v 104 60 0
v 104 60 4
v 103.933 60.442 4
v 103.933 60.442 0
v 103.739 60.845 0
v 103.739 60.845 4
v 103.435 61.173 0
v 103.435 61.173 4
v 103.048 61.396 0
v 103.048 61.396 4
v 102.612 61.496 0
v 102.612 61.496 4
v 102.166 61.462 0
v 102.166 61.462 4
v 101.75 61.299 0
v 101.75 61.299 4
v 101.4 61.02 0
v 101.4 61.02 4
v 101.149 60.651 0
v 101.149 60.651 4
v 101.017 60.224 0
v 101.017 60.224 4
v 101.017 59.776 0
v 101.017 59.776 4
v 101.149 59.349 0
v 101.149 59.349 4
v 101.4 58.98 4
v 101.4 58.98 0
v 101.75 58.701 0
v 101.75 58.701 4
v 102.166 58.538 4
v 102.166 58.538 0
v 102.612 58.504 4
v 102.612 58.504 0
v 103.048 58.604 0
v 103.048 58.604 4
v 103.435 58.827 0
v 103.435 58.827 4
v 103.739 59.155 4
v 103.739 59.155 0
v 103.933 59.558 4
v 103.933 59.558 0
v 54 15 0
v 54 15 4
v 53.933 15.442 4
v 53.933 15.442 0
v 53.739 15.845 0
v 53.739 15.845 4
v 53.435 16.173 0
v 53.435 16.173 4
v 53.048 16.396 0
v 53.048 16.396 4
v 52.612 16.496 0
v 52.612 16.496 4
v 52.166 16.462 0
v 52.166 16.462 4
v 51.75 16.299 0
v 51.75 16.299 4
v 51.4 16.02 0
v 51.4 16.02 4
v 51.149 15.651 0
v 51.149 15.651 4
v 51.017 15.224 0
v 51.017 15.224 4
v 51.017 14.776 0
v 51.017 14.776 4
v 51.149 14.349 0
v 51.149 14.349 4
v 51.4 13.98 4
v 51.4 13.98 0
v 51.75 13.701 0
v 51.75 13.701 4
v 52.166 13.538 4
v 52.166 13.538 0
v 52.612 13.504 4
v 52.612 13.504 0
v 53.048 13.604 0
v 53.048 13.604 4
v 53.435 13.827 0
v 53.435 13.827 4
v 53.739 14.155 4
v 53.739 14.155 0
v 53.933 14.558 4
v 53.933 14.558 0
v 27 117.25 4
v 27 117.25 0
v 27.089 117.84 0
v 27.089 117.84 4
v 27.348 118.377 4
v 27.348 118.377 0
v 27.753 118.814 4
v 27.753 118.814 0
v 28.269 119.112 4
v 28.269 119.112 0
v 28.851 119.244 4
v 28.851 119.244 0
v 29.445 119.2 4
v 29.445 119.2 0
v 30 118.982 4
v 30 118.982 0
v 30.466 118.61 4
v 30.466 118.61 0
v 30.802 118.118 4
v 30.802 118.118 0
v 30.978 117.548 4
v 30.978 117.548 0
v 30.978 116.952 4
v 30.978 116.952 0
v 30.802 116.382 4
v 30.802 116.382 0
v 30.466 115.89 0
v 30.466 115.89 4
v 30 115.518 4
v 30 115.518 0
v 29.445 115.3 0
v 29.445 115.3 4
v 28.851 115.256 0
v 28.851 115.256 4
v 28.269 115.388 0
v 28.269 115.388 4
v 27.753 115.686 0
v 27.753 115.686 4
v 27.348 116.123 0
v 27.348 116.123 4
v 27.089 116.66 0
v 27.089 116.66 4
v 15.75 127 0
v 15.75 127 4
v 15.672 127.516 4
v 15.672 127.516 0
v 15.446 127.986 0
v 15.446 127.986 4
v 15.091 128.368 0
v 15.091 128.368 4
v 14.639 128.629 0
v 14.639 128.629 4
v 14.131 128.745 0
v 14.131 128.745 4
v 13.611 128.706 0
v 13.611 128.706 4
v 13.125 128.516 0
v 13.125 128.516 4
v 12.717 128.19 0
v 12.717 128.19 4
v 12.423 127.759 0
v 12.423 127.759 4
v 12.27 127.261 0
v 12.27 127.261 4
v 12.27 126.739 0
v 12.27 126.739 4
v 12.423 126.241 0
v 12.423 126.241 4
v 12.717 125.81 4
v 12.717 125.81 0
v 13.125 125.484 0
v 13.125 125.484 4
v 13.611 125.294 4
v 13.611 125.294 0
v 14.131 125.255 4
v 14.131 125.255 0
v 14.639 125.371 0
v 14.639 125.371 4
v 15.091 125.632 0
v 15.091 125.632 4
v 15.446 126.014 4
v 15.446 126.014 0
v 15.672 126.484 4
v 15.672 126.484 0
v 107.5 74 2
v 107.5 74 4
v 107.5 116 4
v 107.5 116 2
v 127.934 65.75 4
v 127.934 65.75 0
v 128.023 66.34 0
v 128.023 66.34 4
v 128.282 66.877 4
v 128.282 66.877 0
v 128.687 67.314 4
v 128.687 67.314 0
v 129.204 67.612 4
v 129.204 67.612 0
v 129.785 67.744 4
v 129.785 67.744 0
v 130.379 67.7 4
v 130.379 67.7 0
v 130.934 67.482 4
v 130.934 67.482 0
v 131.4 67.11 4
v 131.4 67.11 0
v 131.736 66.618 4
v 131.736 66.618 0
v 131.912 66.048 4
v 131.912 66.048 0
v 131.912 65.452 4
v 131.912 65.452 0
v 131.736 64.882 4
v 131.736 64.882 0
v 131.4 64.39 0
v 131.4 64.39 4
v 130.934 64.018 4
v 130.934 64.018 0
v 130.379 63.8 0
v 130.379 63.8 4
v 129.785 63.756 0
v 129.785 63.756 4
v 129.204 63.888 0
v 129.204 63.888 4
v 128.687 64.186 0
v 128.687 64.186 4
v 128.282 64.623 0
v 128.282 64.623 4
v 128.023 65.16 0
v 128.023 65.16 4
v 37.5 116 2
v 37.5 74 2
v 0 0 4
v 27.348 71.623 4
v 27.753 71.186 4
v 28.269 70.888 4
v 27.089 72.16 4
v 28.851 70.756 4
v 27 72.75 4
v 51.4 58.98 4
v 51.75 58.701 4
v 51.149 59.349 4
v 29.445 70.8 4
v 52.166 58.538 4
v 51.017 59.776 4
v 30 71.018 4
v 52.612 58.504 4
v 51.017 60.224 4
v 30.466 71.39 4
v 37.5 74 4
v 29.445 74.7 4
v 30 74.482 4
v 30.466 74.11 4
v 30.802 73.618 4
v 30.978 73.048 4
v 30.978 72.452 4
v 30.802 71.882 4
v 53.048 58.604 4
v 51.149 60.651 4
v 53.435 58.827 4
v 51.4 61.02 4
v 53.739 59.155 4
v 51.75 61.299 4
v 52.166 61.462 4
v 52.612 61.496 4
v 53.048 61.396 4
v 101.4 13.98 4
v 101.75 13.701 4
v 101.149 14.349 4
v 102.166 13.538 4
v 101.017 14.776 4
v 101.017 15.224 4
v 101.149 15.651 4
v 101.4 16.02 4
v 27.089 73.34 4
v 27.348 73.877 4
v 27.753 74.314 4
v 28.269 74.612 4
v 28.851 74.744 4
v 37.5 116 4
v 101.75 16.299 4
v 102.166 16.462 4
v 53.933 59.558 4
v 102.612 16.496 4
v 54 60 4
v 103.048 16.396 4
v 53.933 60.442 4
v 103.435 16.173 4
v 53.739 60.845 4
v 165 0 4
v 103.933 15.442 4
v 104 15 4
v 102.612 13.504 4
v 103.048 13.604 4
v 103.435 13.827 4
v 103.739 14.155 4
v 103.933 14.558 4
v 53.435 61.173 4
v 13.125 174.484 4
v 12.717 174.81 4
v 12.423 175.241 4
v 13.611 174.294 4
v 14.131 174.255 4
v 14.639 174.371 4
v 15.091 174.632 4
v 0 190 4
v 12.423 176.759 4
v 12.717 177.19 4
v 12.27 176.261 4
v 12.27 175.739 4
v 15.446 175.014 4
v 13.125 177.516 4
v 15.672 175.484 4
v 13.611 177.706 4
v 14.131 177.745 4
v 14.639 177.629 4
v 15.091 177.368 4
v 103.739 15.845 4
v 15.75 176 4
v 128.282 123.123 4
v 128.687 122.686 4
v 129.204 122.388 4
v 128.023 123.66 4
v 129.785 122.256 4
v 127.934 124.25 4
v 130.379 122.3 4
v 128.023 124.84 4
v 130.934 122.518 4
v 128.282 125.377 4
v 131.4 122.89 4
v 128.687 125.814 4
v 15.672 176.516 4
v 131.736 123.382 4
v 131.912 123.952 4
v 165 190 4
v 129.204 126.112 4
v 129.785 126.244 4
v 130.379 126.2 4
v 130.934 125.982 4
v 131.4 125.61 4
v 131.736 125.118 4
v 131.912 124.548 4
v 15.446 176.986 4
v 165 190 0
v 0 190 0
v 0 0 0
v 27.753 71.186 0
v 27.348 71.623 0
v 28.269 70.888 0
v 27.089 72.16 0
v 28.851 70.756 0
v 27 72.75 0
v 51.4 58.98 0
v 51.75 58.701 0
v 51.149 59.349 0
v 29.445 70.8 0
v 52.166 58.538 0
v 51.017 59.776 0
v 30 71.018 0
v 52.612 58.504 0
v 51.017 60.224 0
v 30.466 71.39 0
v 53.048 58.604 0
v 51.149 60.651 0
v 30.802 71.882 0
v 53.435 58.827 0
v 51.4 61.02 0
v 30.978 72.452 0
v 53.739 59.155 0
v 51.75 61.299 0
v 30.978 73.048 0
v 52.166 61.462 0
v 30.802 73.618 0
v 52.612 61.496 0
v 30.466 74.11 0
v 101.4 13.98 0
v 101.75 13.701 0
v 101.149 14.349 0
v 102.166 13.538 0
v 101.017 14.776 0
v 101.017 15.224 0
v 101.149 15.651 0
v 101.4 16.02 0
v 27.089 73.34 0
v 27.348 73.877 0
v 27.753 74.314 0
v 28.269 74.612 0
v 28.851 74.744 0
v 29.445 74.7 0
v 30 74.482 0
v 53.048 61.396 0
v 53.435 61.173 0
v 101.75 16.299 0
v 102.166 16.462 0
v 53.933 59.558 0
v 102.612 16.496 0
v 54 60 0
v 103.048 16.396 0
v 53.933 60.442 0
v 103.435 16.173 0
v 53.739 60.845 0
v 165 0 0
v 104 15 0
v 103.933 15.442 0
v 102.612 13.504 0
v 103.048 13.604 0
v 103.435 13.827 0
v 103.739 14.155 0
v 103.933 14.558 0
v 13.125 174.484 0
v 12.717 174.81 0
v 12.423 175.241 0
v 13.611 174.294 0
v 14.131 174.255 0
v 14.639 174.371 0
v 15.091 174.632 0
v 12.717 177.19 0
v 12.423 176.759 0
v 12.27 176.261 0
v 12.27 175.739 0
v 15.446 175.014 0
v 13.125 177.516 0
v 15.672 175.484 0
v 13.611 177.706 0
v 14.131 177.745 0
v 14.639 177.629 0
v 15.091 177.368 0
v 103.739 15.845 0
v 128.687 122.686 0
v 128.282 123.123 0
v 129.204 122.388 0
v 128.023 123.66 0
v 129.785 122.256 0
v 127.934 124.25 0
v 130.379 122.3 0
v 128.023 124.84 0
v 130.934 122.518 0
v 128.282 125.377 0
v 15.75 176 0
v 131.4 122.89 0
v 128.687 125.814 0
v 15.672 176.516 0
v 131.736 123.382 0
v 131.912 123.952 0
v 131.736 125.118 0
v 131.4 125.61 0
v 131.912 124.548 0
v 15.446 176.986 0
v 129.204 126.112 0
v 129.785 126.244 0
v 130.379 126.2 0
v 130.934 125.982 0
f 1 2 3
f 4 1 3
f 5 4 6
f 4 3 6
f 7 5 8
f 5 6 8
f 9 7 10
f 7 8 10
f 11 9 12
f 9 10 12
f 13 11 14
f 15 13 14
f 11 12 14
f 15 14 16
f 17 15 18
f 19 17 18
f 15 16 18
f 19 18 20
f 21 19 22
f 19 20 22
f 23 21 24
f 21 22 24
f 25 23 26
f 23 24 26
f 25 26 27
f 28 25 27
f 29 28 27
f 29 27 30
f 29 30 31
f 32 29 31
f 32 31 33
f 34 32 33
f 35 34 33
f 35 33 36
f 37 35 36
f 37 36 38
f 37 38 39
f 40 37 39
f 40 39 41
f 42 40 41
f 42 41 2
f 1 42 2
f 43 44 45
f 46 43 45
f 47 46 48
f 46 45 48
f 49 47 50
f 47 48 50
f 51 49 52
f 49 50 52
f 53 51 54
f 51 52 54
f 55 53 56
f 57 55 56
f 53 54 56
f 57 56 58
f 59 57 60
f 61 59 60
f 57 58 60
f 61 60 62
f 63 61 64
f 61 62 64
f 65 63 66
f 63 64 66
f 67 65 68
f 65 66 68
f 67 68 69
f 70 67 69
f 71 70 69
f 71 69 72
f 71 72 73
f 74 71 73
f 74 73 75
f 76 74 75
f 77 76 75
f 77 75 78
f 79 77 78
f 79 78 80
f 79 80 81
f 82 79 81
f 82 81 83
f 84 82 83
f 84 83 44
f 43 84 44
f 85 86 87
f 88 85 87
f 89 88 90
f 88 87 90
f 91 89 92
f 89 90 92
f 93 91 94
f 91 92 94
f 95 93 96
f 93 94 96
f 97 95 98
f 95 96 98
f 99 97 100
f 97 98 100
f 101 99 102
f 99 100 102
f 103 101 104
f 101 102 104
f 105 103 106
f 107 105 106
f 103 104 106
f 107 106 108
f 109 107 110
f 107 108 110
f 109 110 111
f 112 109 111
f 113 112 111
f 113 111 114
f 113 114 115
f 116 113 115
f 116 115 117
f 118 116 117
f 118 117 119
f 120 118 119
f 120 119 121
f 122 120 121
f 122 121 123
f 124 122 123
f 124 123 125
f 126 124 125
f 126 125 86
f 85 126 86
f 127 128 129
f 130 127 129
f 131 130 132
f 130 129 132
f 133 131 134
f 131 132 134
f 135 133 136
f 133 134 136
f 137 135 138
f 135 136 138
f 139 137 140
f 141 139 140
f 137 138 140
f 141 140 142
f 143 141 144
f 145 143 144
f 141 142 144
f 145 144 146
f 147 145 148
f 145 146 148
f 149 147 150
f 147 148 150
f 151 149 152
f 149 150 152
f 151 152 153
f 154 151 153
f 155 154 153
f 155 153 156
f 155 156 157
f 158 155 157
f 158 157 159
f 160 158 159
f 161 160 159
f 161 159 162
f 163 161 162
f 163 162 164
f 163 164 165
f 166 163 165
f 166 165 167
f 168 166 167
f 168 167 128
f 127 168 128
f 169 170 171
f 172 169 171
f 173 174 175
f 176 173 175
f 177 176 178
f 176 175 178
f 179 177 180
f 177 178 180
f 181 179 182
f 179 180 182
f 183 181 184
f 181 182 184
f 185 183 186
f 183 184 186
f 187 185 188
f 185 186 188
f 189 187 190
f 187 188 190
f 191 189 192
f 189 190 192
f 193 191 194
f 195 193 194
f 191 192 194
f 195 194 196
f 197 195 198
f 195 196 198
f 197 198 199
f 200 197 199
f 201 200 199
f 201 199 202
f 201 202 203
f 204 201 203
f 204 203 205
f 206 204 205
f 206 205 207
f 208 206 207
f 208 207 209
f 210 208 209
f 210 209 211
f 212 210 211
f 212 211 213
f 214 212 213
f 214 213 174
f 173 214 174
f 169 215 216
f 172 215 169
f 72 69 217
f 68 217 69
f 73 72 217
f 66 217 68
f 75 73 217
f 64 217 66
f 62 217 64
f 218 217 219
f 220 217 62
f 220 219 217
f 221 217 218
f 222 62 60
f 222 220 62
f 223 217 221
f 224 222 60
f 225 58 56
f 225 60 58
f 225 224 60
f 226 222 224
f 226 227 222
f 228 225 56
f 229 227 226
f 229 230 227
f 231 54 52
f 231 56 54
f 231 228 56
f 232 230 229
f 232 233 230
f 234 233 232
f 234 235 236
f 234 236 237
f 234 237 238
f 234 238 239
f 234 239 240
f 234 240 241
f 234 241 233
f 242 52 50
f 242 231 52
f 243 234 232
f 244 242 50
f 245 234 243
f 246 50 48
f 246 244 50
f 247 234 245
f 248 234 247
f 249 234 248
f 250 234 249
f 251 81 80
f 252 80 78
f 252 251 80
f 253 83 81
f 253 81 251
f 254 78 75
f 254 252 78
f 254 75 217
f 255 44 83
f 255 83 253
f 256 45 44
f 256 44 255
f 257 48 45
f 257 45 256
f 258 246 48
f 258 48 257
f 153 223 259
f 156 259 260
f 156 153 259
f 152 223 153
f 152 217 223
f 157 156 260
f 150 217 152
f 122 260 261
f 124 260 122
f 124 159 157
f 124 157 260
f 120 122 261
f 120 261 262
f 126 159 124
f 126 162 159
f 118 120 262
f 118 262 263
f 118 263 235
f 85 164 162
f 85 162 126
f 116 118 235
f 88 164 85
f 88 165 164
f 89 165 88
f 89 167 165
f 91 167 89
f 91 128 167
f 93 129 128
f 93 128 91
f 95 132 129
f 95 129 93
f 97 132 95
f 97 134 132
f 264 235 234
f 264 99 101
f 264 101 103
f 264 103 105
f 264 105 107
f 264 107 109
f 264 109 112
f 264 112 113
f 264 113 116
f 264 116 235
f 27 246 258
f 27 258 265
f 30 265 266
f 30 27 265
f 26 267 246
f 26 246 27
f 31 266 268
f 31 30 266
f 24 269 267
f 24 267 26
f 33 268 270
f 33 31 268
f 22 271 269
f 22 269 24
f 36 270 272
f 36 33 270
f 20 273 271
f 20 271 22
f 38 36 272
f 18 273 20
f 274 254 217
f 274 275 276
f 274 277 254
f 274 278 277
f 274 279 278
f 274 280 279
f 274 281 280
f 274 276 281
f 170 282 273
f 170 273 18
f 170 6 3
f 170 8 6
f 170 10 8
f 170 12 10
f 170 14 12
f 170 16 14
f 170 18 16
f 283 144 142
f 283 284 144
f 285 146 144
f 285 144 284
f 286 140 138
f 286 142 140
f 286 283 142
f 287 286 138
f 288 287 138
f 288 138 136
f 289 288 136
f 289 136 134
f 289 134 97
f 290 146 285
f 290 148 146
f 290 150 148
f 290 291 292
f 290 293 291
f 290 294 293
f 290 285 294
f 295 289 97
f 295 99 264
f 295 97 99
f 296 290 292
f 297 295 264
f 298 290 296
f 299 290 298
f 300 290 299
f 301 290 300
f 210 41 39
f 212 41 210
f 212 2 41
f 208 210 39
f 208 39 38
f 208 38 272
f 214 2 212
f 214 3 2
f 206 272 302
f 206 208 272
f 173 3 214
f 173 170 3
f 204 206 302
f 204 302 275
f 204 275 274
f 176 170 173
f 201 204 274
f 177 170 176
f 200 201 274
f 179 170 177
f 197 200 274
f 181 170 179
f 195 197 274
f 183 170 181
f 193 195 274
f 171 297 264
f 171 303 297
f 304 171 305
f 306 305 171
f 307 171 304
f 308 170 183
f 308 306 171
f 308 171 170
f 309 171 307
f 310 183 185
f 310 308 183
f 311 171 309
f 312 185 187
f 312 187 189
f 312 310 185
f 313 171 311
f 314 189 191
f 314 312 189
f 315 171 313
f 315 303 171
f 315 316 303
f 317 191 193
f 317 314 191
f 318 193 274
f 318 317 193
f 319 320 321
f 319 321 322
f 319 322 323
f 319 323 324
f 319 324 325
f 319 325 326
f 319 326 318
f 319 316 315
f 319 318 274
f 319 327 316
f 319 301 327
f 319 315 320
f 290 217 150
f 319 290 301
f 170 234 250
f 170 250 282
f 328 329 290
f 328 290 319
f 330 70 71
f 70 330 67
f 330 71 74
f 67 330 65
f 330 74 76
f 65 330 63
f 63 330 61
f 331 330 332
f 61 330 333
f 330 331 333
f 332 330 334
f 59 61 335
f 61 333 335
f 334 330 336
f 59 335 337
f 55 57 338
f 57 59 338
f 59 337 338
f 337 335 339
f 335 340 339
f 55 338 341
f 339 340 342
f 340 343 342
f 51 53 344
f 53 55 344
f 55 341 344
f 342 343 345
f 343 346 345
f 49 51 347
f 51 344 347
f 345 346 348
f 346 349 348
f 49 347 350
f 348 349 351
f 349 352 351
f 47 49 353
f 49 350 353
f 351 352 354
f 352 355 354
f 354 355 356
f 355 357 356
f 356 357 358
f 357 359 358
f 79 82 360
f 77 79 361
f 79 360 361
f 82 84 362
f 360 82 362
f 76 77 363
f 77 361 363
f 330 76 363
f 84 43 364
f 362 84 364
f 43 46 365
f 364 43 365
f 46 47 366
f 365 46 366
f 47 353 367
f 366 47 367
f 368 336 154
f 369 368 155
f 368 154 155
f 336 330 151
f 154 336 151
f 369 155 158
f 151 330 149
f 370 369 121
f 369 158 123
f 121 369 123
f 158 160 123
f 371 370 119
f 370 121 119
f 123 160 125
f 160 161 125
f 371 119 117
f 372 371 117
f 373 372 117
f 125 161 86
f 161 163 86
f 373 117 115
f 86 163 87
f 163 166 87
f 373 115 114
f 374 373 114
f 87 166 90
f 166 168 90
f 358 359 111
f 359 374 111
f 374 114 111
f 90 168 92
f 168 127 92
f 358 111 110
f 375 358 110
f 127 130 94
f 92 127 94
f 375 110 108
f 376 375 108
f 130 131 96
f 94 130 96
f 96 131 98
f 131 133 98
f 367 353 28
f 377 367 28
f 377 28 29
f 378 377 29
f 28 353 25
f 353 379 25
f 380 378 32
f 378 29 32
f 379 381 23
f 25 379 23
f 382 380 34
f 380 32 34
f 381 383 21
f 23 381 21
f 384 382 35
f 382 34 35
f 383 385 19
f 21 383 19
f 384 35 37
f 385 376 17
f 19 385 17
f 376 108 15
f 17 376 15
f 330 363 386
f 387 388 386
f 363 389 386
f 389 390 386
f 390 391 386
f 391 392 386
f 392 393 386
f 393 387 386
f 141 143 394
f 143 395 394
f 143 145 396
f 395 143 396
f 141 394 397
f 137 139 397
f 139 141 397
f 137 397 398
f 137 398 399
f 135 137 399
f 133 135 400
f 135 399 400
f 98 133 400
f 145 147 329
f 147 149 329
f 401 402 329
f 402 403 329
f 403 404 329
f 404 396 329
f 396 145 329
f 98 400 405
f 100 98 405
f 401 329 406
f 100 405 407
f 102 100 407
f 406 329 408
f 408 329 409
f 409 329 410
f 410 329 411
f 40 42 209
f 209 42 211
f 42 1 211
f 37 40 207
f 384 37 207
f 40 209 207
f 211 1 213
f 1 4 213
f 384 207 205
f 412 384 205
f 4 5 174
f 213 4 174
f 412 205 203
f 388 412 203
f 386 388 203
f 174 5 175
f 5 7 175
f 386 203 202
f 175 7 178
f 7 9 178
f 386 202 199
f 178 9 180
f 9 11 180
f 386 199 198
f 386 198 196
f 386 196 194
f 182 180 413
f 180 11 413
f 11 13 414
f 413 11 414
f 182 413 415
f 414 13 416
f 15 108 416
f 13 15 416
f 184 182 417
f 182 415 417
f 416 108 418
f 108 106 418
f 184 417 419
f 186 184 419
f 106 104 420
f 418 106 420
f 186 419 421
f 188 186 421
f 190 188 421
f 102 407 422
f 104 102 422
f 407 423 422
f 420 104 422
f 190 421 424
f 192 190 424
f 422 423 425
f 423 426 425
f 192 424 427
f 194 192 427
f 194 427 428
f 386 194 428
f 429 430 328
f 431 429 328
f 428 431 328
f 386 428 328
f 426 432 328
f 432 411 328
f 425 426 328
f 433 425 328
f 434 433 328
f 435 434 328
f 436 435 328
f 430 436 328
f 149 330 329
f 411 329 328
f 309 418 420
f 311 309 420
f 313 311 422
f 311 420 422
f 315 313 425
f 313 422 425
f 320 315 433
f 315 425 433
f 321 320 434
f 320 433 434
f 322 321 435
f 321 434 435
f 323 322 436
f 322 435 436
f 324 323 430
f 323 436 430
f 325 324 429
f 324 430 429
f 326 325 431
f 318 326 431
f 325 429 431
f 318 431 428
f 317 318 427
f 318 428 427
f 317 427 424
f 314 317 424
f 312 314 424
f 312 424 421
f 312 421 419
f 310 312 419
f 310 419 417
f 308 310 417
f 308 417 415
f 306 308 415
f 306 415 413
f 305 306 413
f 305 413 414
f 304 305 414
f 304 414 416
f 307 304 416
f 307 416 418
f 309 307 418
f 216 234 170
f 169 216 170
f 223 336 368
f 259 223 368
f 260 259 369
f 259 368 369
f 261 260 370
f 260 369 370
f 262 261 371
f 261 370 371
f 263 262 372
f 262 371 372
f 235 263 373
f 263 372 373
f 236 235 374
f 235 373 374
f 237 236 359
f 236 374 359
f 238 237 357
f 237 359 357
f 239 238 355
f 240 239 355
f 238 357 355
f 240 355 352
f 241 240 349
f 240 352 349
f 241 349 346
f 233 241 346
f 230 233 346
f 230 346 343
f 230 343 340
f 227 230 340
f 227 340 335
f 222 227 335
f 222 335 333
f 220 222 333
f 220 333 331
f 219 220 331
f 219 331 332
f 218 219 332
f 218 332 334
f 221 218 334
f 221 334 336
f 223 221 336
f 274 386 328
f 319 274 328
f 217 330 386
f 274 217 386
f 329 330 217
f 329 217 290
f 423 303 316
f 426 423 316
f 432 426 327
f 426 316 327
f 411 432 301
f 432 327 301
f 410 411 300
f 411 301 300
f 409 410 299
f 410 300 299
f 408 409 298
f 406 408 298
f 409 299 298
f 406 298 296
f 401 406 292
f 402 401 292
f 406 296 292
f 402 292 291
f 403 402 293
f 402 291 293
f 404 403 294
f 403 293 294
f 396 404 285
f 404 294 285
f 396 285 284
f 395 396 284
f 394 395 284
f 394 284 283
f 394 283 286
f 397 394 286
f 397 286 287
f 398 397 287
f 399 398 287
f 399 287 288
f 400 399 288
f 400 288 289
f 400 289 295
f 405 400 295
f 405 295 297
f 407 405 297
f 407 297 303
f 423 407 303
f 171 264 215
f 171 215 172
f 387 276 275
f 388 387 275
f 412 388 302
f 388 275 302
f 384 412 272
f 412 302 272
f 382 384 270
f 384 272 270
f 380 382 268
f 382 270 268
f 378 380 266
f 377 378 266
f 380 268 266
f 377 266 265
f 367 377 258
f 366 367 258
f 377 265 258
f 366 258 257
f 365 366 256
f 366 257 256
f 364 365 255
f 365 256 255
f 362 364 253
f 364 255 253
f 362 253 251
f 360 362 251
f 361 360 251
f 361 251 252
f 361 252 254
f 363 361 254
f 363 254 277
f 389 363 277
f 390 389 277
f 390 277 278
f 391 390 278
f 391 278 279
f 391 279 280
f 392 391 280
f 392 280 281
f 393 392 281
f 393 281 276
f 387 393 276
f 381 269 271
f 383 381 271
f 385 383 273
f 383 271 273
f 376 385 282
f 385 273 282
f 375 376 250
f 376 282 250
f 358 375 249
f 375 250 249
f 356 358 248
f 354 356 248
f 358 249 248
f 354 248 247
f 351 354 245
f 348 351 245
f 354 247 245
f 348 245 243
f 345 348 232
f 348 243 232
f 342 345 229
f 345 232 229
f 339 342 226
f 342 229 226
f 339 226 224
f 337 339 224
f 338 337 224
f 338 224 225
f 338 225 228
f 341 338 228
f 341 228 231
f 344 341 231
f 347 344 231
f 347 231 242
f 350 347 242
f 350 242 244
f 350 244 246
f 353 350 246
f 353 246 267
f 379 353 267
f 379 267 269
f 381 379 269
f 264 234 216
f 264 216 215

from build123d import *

# Parameters (mm, degrees)
ESQUISSE1_W             = 165
ESQUISSE1_H             = 190
BOSS_EXTRU_1_DEPTH      = 4
ESQUISSE2_R             = 2
ENL_V_MAT_EXTRU_1_DEPTH = 10
ESQUISSE3_R             = 1.75
ENL_V_MAT_EXTRU_2_DEPTH = 10
ESQUISSE4_R             = 1.5
ENL_V_MAT_EXTRU_3_DEPTH = 10
ESQUISSE5_W             = 70
ESQUISSE5_H             = 42
ENL_V_MAT_EXTRU_4_DEPTH = 2


with BuildPart() as part:
    # Esquisse1 → Boss.-Extru.1 (new body)
    with BuildSketch(Plane.XY):
        with Locations((82.5, 95)):
            Rectangle(ESQUISSE1_W, ESQUISSE1_H)
    extrude(amount=BOSS_EXTRU_1_DEPTH)

    # Esquisse2 → Enlèv. mat.-Extru.1 (cut)
    with BuildSketch(Plane(origin=(0, 0, 0), x_dir=(-1, 0, 0), z_dir=(0, 0, -1))):
        with Locations((-129.934319196, 124.25)):
            Circle(ESQUISSE2_R)
        with Locations((-29, 117.25)):
            Circle(ESQUISSE2_R)
        with Locations((-29, 72.75)):
            Circle(ESQUISSE2_R)
        with Locations((-129.934319196, 65.75)):
            Circle(ESQUISSE2_R)
    extrude(amount=-ENL_V_MAT_EXTRU_1_DEPTH, mode=Mode.SUBTRACT)

    # Esquisse3 → Enlèv. mat.-Extru.2 (cut)
    with BuildSketch(Plane.XY.offset(4)):
        with Locations((14, 176)):
            Circle(ESQUISSE3_R)
        with Locations((14, 127)):
            Circle(ESQUISSE3_R)
    extrude(amount=-ENL_V_MAT_EXTRU_2_DEPTH, mode=Mode.SUBTRACT)

    # Esquisse4 → Enlèv. mat.-Extru.3 (cut)
    with BuildSketch(Plane.XY.offset(4)):
        with Locations((52.5, 15)):
            Circle(ESQUISSE4_R)
        with Locations((52.5, 60)):
            Circle(ESQUISSE4_R)
        with Locations((102.5, 60)):
            Circle(ESQUISSE4_R)
        with Locations((102.5, 15)):
            Circle(ESQUISSE4_R)
    extrude(amount=-ENL_V_MAT_EXTRU_3_DEPTH, mode=Mode.SUBTRACT)

    # Esquisse5 → Enlèv. mat.-Extru.4 (cut)
    with BuildSketch(Plane.XY.offset(4)):
        with Locations((72.5, 95)):
            Rectangle(ESQUISSE5_W, ESQUISSE5_H)
    extrude(amount=-ENL_V_MAT_EXTRU_4_DEPTH, mode=Mode.SUBTRACT)


solid = part.part
